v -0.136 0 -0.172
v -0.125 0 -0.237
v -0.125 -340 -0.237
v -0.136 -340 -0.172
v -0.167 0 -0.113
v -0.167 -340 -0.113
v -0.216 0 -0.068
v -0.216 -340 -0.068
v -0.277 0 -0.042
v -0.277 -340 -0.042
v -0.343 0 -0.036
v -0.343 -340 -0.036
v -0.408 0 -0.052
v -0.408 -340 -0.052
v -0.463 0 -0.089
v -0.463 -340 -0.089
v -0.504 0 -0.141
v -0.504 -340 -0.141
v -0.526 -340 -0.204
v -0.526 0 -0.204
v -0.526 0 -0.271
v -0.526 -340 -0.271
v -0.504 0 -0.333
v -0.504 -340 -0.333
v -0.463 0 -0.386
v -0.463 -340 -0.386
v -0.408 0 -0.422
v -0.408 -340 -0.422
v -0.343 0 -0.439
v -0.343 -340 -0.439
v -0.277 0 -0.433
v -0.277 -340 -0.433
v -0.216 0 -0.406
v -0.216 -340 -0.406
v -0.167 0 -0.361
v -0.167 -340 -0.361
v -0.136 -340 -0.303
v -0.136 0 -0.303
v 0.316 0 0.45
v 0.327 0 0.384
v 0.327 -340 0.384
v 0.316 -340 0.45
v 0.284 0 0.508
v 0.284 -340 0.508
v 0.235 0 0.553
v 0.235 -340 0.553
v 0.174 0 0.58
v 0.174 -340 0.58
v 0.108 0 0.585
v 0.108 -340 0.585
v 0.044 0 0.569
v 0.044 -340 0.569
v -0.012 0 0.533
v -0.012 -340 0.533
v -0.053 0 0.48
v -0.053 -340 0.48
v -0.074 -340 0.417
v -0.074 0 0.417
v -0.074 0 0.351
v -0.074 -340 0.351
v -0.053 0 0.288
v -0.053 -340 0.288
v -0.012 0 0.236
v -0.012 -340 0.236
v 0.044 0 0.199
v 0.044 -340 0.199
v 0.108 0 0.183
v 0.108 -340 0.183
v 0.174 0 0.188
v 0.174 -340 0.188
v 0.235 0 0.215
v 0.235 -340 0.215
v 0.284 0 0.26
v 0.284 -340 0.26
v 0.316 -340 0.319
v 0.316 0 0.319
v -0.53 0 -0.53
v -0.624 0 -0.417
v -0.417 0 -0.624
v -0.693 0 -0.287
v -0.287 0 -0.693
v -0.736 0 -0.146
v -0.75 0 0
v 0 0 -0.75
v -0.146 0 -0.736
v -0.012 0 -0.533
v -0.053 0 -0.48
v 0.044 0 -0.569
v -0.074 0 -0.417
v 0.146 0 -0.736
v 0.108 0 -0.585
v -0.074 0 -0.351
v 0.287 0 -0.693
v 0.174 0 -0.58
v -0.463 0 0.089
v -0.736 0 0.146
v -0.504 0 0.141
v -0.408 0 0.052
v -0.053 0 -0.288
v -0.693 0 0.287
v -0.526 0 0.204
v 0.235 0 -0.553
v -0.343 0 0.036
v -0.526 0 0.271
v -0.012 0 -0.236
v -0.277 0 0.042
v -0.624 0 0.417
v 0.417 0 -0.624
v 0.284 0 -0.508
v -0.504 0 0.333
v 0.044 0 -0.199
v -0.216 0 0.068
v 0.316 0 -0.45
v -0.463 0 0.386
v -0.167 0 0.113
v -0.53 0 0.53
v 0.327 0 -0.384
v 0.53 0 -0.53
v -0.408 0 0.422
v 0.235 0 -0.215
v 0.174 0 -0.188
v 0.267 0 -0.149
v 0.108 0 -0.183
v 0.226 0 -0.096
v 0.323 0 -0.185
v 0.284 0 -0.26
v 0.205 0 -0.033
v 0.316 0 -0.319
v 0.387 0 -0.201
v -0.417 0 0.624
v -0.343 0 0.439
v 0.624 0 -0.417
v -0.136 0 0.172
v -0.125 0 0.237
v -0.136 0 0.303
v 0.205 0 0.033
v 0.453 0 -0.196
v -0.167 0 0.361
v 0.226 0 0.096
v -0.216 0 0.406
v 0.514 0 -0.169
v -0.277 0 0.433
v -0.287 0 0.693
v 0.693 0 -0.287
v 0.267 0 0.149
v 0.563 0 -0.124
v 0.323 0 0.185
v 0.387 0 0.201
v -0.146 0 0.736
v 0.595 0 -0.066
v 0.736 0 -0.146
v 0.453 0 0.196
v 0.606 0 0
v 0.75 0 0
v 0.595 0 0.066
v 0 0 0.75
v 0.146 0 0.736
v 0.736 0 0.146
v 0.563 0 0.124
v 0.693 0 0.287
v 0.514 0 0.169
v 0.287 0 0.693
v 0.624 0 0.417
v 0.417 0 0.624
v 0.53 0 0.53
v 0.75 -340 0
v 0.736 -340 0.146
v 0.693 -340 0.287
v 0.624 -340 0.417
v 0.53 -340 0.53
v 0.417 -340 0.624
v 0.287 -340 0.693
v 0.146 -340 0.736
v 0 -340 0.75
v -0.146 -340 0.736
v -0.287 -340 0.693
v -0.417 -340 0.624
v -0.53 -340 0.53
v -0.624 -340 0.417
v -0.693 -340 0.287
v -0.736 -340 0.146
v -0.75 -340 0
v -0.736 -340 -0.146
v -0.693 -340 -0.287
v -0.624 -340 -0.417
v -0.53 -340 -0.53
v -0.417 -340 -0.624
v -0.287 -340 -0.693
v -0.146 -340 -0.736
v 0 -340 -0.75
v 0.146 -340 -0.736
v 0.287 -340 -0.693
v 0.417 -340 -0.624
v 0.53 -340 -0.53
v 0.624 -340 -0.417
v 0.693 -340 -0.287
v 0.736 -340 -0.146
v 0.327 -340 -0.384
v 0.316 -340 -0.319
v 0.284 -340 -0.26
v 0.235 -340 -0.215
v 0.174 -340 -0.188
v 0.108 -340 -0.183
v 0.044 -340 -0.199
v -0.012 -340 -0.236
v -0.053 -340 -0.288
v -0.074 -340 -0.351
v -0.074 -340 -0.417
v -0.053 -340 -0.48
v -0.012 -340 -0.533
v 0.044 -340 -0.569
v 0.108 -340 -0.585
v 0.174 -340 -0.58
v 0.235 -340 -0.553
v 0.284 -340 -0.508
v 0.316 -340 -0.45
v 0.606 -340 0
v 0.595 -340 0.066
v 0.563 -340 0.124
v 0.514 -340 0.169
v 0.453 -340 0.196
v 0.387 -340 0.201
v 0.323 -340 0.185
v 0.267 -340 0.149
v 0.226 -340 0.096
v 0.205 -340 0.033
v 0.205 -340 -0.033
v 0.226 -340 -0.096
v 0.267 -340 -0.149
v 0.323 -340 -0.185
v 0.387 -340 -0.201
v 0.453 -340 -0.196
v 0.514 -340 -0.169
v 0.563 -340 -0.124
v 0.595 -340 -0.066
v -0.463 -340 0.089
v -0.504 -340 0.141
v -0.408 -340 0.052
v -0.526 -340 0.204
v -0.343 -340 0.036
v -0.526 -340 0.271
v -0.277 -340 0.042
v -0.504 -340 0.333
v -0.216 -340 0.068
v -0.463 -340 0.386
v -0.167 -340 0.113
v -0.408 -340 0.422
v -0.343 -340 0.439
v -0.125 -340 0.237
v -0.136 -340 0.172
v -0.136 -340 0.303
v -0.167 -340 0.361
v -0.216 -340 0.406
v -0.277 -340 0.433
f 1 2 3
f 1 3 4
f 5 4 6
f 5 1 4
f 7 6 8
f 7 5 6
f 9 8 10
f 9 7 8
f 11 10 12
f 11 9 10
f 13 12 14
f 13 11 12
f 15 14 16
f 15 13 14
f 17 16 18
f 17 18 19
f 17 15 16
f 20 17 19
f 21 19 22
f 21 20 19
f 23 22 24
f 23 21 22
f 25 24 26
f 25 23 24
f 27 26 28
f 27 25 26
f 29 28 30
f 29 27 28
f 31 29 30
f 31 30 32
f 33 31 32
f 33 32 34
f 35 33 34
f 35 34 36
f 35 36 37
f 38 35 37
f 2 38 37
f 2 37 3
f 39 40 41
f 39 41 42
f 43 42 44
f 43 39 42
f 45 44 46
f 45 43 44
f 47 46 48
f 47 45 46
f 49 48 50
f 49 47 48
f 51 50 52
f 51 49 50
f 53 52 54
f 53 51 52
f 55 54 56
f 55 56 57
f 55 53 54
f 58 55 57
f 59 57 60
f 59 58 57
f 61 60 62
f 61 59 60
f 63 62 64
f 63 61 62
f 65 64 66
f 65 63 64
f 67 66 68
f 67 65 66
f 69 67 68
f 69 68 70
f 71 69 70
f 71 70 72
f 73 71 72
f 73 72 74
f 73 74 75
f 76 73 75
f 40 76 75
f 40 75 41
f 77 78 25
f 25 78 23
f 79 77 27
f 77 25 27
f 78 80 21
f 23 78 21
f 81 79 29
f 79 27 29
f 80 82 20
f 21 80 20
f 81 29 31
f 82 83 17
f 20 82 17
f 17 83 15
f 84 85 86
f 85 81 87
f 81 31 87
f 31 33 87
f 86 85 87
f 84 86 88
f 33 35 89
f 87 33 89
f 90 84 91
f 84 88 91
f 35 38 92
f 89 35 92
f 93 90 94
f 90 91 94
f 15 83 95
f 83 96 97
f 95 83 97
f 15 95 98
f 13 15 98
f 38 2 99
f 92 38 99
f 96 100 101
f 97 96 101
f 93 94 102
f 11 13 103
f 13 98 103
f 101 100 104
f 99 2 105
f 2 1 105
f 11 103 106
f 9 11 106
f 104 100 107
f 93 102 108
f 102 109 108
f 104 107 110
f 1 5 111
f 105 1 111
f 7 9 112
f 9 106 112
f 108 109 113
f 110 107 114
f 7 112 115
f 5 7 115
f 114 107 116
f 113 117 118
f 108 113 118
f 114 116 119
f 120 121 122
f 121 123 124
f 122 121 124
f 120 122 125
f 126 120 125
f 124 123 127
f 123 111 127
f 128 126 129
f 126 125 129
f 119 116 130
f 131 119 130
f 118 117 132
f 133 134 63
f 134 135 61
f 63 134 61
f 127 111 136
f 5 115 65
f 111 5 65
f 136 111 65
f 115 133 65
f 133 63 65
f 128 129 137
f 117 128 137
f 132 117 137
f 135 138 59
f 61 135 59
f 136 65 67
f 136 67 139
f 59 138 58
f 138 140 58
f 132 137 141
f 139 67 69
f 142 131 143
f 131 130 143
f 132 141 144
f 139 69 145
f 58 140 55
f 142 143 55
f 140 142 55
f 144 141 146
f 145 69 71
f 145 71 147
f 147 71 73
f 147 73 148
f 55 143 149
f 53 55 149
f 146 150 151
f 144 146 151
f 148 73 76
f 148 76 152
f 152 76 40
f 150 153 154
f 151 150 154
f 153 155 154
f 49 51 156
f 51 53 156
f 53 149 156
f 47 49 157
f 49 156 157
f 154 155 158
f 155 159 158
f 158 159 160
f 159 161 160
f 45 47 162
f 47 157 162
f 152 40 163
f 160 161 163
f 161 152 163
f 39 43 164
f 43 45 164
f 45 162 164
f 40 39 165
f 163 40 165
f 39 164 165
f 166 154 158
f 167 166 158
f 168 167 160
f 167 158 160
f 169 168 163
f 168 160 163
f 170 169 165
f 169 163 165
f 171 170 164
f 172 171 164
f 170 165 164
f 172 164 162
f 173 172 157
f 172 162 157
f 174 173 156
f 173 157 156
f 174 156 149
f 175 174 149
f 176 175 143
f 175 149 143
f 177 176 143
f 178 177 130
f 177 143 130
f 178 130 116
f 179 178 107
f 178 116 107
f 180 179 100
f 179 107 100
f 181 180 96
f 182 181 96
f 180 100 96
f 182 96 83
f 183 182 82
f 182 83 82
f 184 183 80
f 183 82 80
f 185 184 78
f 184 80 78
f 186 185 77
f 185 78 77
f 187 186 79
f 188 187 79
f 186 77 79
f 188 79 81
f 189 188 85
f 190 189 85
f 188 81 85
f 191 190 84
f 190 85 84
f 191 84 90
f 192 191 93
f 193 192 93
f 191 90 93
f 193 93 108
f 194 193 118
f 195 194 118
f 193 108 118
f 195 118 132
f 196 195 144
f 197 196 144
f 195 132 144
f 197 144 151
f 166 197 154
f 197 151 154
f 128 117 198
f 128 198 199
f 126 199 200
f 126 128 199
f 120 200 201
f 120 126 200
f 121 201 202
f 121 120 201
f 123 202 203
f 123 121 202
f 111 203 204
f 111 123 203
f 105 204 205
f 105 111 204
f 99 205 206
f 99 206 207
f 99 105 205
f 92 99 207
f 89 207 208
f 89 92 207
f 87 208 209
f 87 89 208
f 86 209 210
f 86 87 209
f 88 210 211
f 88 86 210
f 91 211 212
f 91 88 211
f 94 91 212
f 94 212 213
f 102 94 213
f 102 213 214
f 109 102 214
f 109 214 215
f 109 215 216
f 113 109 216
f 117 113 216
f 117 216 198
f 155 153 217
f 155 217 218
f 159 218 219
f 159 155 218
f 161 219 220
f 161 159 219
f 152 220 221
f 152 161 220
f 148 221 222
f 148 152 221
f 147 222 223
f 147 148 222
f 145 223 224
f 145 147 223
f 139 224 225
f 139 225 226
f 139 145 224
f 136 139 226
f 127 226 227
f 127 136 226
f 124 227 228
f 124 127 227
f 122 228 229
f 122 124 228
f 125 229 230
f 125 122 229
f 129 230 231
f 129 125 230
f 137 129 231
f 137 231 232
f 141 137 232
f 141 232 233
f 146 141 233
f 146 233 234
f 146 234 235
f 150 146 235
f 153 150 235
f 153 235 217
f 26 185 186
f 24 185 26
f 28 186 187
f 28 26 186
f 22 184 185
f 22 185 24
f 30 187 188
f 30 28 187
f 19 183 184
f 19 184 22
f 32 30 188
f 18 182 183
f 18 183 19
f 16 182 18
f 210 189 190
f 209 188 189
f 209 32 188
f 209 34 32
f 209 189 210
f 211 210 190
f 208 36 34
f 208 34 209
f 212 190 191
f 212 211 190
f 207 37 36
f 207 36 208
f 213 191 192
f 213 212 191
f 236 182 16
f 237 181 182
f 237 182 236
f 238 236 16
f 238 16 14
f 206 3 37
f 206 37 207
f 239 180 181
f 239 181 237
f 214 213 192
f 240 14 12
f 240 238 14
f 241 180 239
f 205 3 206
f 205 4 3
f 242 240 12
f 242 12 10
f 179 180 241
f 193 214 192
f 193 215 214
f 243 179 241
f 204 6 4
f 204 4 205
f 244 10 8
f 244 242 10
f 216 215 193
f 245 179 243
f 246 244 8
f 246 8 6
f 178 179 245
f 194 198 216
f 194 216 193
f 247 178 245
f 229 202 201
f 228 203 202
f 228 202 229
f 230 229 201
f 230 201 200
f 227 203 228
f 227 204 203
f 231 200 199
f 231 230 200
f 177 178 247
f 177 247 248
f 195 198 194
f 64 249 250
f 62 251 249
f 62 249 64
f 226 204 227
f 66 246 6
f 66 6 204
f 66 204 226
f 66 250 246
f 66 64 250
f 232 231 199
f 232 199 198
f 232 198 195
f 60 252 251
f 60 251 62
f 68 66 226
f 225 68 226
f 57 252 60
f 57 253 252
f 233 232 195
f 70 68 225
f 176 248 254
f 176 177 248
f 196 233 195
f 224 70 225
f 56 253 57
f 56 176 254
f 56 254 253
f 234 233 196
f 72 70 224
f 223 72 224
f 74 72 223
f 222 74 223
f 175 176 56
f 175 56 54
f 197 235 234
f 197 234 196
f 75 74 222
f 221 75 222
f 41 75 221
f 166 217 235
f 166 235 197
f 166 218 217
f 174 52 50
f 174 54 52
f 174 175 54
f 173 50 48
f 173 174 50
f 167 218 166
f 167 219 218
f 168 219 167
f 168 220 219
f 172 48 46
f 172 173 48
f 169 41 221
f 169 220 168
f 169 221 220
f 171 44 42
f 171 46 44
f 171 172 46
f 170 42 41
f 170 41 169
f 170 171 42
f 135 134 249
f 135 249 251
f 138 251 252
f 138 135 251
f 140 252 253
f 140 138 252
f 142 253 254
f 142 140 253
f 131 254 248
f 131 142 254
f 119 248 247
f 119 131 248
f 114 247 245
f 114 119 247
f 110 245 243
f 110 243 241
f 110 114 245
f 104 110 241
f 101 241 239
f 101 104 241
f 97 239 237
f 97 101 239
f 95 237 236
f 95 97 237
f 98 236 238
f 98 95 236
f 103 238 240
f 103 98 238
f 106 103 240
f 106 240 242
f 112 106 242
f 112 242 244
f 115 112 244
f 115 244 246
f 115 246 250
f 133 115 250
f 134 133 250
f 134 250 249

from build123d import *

# Parameters (mm, degrees)
F0_R     = 0.75
F0_R_2   = 0.20193
F1_DEPTH = 340


with BuildPart() as f1:
    # F0 (on Front) → F1 (new body)
    with BuildSketch(Plane.XZ):
        Circle(F0_R)
        with Locations((-0.32673, -0.237383)):
            Circle(F0_R_2, mode=Mode.SUBTRACT)
        with Locations((0.1248, -0.384094)):
            Circle(F0_R_2, mode=Mode.SUBTRACT)
        with Locations((-0.32673, 0.237383)):
            Circle(F0_R_2, mode=Mode.SUBTRACT)
        with Locations((0.40386, 0)):
            Circle(F0_R_2, mode=Mode.SUBTRACT)
        with Locations((0.1248, 0.384094)):
            Circle(F0_R_2, mode=Mode.SUBTRACT)
    extrude(amount=F1_DEPTH)


solid = f1.part
